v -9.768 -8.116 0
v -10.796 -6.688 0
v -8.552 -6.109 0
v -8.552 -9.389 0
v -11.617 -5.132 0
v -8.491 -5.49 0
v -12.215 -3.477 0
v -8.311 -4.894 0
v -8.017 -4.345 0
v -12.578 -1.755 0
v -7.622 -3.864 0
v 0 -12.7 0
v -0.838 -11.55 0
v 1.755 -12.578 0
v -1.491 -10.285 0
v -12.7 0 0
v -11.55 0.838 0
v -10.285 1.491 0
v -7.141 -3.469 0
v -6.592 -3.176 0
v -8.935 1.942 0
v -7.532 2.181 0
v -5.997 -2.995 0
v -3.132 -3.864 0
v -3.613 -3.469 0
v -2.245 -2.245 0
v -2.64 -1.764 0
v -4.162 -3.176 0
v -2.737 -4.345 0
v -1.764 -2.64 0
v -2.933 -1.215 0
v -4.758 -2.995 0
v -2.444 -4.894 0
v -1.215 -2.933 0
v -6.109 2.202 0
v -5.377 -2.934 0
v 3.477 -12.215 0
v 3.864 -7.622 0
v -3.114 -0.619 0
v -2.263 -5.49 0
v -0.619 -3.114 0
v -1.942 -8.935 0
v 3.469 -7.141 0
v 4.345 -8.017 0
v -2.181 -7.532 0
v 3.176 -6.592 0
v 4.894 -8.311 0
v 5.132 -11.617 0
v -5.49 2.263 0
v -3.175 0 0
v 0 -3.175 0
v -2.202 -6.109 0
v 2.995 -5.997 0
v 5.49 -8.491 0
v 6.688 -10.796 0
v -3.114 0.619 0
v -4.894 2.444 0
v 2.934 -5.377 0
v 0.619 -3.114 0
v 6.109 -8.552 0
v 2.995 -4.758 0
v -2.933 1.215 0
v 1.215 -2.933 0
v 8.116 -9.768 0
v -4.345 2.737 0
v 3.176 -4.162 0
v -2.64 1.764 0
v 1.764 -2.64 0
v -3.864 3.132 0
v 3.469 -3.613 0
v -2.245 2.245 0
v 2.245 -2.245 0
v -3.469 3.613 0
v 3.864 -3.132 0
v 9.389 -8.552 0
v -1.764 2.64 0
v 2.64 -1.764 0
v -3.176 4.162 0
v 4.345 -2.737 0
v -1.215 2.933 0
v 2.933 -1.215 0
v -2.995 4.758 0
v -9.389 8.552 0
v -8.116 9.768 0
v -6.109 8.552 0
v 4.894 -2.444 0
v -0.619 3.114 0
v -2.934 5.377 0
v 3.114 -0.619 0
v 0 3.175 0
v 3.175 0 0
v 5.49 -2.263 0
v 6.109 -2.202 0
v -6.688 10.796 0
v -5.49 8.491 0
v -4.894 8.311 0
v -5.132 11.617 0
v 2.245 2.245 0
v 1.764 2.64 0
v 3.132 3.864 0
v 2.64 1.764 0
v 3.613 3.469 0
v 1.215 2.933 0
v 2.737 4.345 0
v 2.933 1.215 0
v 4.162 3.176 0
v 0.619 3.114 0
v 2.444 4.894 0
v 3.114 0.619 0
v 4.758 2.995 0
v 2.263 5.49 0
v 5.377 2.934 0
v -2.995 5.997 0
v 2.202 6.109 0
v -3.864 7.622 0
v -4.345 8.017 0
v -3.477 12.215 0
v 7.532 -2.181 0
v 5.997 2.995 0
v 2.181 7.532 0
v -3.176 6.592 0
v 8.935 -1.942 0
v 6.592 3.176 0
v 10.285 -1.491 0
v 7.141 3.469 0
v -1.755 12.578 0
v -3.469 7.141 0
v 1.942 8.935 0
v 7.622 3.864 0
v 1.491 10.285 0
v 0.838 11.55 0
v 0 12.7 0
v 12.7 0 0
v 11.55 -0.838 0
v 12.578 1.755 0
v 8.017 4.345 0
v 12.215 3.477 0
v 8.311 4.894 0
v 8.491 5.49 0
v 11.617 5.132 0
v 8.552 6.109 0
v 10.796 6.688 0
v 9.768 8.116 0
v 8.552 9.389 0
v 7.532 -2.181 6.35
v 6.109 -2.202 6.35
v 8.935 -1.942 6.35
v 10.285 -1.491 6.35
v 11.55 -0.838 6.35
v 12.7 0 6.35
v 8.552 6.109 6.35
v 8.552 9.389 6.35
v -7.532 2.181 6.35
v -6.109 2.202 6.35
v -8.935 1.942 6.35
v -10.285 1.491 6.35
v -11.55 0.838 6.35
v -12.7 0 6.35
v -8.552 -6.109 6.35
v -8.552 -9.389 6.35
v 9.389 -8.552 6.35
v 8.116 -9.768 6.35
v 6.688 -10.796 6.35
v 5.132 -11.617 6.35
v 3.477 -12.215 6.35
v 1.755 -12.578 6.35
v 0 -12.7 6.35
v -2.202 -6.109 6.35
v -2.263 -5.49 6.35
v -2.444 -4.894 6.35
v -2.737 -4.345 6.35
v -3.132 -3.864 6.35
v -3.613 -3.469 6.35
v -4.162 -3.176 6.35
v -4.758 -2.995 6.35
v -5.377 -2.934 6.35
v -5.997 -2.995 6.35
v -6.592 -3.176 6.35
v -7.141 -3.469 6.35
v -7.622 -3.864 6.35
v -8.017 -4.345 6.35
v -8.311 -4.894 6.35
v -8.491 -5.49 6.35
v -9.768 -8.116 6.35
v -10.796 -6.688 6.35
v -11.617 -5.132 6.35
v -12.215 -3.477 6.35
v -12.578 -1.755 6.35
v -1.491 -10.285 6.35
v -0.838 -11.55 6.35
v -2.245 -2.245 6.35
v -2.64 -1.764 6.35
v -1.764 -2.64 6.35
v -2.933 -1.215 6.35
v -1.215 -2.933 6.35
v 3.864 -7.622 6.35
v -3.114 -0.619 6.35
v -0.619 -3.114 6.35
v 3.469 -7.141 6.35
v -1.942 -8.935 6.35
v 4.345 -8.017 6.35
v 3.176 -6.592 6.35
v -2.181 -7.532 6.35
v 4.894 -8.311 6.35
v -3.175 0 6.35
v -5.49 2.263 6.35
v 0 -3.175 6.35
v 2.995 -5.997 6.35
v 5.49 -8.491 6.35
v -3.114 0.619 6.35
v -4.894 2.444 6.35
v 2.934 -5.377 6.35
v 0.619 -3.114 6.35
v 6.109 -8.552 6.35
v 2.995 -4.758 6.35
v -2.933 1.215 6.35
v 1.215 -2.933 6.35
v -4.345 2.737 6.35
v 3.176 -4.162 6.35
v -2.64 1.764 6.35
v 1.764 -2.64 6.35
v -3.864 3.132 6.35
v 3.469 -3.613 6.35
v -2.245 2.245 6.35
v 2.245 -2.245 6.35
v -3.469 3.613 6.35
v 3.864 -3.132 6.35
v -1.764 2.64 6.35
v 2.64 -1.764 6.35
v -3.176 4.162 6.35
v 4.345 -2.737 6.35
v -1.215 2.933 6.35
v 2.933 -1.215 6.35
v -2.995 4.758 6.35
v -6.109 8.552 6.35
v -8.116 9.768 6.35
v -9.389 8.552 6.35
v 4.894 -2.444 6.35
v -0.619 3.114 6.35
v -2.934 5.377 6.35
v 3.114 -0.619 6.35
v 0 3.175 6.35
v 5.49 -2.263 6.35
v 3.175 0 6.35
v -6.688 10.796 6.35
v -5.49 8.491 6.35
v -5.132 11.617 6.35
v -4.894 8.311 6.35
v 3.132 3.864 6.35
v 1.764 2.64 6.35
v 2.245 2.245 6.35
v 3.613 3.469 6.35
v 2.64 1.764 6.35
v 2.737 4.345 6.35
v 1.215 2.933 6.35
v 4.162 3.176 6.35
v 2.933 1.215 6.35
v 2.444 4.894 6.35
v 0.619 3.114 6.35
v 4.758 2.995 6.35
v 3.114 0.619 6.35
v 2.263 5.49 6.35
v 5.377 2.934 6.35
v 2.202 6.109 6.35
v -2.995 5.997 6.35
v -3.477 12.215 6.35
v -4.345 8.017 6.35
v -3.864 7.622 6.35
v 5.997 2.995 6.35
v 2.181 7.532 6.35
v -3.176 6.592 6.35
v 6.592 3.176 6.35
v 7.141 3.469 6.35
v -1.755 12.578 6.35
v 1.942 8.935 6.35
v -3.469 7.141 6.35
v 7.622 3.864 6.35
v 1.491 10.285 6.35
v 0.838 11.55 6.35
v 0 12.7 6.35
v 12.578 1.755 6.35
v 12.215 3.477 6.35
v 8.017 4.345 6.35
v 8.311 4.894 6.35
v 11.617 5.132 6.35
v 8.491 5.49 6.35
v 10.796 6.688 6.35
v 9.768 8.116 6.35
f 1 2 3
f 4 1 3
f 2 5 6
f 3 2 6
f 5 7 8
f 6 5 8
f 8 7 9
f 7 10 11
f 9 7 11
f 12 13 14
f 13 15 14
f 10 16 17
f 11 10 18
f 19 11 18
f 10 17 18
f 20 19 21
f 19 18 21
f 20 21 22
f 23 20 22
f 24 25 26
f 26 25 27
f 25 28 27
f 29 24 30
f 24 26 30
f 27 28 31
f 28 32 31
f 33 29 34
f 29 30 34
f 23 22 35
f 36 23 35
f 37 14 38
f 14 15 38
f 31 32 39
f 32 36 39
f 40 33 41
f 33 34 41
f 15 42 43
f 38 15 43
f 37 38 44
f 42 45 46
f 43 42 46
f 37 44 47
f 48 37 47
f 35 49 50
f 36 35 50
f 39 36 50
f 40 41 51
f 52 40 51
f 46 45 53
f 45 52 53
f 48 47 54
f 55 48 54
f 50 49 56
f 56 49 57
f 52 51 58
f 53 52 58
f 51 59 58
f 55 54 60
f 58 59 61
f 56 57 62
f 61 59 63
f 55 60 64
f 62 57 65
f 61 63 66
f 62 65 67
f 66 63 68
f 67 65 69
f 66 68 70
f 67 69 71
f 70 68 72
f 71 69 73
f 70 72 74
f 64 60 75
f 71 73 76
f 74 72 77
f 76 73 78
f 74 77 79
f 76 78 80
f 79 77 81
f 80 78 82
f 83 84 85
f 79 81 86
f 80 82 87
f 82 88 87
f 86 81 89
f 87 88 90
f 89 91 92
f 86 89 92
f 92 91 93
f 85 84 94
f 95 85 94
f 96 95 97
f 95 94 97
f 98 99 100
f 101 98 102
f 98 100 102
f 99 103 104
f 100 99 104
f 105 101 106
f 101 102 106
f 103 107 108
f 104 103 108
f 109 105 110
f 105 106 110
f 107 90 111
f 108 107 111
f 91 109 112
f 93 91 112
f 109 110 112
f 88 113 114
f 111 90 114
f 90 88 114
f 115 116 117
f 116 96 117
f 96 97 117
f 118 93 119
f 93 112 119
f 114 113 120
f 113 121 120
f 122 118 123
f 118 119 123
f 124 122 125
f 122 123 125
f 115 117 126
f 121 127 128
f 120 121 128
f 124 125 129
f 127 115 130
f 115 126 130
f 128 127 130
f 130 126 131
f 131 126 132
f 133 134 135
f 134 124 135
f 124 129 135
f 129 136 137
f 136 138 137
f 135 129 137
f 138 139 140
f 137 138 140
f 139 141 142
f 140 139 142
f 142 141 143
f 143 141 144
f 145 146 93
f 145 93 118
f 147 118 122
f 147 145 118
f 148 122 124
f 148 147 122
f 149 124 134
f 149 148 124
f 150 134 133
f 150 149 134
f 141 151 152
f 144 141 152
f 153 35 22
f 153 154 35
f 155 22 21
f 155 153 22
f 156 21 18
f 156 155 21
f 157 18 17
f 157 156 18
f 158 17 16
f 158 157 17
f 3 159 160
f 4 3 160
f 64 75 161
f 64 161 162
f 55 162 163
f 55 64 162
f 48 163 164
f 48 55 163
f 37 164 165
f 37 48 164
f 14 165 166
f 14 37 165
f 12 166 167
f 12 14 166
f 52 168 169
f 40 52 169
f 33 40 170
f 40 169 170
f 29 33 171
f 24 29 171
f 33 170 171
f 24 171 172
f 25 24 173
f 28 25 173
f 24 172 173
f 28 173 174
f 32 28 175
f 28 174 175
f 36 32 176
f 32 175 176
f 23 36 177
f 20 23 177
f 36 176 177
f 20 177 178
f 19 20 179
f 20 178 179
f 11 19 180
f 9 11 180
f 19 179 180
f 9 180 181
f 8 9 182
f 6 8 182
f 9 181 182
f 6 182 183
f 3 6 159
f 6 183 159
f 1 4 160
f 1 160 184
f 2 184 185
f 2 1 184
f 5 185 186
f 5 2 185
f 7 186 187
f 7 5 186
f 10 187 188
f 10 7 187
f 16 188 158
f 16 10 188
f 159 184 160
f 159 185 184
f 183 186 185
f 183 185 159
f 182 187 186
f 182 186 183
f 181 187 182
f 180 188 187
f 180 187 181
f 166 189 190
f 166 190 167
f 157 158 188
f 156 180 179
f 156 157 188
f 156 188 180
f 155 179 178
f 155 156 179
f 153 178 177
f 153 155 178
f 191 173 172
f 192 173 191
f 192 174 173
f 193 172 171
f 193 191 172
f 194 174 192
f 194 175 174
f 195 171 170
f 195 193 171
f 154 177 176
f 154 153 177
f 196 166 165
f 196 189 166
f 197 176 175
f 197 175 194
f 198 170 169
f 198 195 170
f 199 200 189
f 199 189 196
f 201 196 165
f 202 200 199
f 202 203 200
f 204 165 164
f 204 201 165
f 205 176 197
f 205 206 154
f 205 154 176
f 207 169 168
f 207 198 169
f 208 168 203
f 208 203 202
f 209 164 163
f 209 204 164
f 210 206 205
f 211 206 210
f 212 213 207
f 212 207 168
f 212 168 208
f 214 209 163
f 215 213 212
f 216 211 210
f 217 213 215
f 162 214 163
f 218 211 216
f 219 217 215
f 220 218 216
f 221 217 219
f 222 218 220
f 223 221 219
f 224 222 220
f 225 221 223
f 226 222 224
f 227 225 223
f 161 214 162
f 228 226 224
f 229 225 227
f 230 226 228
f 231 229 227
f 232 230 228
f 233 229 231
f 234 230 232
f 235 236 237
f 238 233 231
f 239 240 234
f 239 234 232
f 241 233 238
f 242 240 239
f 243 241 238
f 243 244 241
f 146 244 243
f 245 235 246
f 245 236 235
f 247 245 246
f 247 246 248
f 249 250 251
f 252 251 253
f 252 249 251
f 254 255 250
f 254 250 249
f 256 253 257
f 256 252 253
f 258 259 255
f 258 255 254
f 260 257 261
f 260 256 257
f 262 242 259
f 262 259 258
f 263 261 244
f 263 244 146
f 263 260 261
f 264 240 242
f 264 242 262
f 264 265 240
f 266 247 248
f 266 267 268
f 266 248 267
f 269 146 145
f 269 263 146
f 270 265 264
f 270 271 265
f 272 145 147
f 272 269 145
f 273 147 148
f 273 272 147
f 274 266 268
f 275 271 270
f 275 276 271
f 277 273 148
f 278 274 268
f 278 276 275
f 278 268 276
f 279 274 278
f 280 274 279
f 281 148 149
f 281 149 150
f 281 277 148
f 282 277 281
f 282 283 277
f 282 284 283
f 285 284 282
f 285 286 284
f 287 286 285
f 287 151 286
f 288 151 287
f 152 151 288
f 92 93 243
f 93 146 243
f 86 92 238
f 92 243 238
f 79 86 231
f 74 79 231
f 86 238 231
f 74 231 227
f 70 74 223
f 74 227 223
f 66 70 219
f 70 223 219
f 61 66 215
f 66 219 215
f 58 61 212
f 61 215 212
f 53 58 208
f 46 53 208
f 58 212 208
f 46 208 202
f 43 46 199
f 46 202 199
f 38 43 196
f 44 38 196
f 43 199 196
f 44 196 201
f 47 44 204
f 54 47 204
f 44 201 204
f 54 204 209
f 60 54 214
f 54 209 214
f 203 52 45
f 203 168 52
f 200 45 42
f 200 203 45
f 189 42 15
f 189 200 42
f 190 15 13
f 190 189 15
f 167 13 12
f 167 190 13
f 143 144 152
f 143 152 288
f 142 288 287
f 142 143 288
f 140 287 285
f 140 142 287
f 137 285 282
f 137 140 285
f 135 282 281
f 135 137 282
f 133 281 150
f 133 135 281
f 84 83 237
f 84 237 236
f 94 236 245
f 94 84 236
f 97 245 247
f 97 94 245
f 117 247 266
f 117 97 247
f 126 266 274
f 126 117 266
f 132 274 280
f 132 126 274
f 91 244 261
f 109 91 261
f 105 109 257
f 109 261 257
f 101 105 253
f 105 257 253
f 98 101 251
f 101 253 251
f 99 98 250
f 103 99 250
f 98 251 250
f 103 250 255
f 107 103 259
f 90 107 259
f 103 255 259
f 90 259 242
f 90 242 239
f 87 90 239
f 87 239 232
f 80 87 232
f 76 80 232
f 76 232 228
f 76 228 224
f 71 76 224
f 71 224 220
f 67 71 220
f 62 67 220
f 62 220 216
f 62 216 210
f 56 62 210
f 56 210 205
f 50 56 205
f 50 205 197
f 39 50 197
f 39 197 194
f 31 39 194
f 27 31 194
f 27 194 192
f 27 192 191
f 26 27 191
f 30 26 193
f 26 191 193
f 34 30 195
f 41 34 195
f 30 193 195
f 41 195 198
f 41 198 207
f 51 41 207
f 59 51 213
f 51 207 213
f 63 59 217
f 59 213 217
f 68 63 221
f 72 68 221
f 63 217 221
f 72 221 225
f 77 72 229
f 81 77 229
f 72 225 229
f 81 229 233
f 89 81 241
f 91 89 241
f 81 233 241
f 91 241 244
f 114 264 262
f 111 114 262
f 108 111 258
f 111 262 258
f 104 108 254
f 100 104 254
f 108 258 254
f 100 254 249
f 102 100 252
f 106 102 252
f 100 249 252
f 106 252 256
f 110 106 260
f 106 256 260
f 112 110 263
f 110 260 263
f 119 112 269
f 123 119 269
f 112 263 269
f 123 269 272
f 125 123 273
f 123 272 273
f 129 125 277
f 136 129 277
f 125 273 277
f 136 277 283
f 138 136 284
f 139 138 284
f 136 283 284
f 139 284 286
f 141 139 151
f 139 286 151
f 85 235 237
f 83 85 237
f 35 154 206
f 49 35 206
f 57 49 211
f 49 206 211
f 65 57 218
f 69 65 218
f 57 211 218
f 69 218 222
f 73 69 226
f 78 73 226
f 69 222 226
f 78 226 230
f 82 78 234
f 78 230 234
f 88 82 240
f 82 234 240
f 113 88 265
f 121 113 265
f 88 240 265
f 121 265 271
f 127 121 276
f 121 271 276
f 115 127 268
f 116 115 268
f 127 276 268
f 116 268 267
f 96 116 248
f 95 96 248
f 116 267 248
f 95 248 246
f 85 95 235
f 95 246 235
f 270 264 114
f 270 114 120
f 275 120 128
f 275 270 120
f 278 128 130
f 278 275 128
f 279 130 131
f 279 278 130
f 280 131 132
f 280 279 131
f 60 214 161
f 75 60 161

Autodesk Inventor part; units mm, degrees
ref_plane "YZ Plane" through (0, 0, 0) normal (1, 0, 0) x (0, 1, 0)
ref_plane "XZ Plane" through (0, 0, 0) normal (0, 1, 0) x (-1, 0, 0)
ref_plane "XY Plane" through (0, 0, 0) normal (0, 0, 1) x (1, 0, 0)
sketch "Sketch1" plane through (0, 0, 0) normal (0, 0, 1) x (1, 0, 0)
  circle A0 centre (0, 0) radius 12.7
  dimension "d0" = 25.4
extrude "Extrusion1" add sketch "Sketch1" along normal blind 6.35
sketch "Sketch2" plane through (0, 0, 6.35) normal (0, 0, 1) x (1, 0, 0)
  circle A0 centre (0, 0) radius 12.7 projected
  arc A1 (-6.4006, 2.2157) -> (-6.1091, 8.5523) centre (-6.1091, 5.3773) ccw
  line L0 (-6.1091, 8.5523) -> (-9.3887, 8.5523)
  arc A2 (-6.1091, 2.2023) -> (-12.7, 0) centre (-6.6809, -7.0502) ccw
  dimension "d3" = 6.35
extrude "Extrusion2" cut sketch "Sketch2" against normal blind 50.8 contours L0 A1 A2 A0 picked at (-7.9, 5.5911)
pattern_circular "Circular Pattern1" count 4 over 360 about axis through (0, 0, -10) along (0, 0, 1) of "Extrusion2"
sketch "Sketch3" plane through (0, 0, 6.35) normal (0, 0, 1) x (1, 0, 0)
  arc A0 (12.7, 0) -> (8.5523, 9.3887) centre (0, 0) ccw projected
  circle A1 centre (0, 0) radius 3.175
  dimension "d9" = 6.35
extrude "Extrusion3" cut sketch "Sketch3" against normal blind 50.8
properties part number "ratchet"
